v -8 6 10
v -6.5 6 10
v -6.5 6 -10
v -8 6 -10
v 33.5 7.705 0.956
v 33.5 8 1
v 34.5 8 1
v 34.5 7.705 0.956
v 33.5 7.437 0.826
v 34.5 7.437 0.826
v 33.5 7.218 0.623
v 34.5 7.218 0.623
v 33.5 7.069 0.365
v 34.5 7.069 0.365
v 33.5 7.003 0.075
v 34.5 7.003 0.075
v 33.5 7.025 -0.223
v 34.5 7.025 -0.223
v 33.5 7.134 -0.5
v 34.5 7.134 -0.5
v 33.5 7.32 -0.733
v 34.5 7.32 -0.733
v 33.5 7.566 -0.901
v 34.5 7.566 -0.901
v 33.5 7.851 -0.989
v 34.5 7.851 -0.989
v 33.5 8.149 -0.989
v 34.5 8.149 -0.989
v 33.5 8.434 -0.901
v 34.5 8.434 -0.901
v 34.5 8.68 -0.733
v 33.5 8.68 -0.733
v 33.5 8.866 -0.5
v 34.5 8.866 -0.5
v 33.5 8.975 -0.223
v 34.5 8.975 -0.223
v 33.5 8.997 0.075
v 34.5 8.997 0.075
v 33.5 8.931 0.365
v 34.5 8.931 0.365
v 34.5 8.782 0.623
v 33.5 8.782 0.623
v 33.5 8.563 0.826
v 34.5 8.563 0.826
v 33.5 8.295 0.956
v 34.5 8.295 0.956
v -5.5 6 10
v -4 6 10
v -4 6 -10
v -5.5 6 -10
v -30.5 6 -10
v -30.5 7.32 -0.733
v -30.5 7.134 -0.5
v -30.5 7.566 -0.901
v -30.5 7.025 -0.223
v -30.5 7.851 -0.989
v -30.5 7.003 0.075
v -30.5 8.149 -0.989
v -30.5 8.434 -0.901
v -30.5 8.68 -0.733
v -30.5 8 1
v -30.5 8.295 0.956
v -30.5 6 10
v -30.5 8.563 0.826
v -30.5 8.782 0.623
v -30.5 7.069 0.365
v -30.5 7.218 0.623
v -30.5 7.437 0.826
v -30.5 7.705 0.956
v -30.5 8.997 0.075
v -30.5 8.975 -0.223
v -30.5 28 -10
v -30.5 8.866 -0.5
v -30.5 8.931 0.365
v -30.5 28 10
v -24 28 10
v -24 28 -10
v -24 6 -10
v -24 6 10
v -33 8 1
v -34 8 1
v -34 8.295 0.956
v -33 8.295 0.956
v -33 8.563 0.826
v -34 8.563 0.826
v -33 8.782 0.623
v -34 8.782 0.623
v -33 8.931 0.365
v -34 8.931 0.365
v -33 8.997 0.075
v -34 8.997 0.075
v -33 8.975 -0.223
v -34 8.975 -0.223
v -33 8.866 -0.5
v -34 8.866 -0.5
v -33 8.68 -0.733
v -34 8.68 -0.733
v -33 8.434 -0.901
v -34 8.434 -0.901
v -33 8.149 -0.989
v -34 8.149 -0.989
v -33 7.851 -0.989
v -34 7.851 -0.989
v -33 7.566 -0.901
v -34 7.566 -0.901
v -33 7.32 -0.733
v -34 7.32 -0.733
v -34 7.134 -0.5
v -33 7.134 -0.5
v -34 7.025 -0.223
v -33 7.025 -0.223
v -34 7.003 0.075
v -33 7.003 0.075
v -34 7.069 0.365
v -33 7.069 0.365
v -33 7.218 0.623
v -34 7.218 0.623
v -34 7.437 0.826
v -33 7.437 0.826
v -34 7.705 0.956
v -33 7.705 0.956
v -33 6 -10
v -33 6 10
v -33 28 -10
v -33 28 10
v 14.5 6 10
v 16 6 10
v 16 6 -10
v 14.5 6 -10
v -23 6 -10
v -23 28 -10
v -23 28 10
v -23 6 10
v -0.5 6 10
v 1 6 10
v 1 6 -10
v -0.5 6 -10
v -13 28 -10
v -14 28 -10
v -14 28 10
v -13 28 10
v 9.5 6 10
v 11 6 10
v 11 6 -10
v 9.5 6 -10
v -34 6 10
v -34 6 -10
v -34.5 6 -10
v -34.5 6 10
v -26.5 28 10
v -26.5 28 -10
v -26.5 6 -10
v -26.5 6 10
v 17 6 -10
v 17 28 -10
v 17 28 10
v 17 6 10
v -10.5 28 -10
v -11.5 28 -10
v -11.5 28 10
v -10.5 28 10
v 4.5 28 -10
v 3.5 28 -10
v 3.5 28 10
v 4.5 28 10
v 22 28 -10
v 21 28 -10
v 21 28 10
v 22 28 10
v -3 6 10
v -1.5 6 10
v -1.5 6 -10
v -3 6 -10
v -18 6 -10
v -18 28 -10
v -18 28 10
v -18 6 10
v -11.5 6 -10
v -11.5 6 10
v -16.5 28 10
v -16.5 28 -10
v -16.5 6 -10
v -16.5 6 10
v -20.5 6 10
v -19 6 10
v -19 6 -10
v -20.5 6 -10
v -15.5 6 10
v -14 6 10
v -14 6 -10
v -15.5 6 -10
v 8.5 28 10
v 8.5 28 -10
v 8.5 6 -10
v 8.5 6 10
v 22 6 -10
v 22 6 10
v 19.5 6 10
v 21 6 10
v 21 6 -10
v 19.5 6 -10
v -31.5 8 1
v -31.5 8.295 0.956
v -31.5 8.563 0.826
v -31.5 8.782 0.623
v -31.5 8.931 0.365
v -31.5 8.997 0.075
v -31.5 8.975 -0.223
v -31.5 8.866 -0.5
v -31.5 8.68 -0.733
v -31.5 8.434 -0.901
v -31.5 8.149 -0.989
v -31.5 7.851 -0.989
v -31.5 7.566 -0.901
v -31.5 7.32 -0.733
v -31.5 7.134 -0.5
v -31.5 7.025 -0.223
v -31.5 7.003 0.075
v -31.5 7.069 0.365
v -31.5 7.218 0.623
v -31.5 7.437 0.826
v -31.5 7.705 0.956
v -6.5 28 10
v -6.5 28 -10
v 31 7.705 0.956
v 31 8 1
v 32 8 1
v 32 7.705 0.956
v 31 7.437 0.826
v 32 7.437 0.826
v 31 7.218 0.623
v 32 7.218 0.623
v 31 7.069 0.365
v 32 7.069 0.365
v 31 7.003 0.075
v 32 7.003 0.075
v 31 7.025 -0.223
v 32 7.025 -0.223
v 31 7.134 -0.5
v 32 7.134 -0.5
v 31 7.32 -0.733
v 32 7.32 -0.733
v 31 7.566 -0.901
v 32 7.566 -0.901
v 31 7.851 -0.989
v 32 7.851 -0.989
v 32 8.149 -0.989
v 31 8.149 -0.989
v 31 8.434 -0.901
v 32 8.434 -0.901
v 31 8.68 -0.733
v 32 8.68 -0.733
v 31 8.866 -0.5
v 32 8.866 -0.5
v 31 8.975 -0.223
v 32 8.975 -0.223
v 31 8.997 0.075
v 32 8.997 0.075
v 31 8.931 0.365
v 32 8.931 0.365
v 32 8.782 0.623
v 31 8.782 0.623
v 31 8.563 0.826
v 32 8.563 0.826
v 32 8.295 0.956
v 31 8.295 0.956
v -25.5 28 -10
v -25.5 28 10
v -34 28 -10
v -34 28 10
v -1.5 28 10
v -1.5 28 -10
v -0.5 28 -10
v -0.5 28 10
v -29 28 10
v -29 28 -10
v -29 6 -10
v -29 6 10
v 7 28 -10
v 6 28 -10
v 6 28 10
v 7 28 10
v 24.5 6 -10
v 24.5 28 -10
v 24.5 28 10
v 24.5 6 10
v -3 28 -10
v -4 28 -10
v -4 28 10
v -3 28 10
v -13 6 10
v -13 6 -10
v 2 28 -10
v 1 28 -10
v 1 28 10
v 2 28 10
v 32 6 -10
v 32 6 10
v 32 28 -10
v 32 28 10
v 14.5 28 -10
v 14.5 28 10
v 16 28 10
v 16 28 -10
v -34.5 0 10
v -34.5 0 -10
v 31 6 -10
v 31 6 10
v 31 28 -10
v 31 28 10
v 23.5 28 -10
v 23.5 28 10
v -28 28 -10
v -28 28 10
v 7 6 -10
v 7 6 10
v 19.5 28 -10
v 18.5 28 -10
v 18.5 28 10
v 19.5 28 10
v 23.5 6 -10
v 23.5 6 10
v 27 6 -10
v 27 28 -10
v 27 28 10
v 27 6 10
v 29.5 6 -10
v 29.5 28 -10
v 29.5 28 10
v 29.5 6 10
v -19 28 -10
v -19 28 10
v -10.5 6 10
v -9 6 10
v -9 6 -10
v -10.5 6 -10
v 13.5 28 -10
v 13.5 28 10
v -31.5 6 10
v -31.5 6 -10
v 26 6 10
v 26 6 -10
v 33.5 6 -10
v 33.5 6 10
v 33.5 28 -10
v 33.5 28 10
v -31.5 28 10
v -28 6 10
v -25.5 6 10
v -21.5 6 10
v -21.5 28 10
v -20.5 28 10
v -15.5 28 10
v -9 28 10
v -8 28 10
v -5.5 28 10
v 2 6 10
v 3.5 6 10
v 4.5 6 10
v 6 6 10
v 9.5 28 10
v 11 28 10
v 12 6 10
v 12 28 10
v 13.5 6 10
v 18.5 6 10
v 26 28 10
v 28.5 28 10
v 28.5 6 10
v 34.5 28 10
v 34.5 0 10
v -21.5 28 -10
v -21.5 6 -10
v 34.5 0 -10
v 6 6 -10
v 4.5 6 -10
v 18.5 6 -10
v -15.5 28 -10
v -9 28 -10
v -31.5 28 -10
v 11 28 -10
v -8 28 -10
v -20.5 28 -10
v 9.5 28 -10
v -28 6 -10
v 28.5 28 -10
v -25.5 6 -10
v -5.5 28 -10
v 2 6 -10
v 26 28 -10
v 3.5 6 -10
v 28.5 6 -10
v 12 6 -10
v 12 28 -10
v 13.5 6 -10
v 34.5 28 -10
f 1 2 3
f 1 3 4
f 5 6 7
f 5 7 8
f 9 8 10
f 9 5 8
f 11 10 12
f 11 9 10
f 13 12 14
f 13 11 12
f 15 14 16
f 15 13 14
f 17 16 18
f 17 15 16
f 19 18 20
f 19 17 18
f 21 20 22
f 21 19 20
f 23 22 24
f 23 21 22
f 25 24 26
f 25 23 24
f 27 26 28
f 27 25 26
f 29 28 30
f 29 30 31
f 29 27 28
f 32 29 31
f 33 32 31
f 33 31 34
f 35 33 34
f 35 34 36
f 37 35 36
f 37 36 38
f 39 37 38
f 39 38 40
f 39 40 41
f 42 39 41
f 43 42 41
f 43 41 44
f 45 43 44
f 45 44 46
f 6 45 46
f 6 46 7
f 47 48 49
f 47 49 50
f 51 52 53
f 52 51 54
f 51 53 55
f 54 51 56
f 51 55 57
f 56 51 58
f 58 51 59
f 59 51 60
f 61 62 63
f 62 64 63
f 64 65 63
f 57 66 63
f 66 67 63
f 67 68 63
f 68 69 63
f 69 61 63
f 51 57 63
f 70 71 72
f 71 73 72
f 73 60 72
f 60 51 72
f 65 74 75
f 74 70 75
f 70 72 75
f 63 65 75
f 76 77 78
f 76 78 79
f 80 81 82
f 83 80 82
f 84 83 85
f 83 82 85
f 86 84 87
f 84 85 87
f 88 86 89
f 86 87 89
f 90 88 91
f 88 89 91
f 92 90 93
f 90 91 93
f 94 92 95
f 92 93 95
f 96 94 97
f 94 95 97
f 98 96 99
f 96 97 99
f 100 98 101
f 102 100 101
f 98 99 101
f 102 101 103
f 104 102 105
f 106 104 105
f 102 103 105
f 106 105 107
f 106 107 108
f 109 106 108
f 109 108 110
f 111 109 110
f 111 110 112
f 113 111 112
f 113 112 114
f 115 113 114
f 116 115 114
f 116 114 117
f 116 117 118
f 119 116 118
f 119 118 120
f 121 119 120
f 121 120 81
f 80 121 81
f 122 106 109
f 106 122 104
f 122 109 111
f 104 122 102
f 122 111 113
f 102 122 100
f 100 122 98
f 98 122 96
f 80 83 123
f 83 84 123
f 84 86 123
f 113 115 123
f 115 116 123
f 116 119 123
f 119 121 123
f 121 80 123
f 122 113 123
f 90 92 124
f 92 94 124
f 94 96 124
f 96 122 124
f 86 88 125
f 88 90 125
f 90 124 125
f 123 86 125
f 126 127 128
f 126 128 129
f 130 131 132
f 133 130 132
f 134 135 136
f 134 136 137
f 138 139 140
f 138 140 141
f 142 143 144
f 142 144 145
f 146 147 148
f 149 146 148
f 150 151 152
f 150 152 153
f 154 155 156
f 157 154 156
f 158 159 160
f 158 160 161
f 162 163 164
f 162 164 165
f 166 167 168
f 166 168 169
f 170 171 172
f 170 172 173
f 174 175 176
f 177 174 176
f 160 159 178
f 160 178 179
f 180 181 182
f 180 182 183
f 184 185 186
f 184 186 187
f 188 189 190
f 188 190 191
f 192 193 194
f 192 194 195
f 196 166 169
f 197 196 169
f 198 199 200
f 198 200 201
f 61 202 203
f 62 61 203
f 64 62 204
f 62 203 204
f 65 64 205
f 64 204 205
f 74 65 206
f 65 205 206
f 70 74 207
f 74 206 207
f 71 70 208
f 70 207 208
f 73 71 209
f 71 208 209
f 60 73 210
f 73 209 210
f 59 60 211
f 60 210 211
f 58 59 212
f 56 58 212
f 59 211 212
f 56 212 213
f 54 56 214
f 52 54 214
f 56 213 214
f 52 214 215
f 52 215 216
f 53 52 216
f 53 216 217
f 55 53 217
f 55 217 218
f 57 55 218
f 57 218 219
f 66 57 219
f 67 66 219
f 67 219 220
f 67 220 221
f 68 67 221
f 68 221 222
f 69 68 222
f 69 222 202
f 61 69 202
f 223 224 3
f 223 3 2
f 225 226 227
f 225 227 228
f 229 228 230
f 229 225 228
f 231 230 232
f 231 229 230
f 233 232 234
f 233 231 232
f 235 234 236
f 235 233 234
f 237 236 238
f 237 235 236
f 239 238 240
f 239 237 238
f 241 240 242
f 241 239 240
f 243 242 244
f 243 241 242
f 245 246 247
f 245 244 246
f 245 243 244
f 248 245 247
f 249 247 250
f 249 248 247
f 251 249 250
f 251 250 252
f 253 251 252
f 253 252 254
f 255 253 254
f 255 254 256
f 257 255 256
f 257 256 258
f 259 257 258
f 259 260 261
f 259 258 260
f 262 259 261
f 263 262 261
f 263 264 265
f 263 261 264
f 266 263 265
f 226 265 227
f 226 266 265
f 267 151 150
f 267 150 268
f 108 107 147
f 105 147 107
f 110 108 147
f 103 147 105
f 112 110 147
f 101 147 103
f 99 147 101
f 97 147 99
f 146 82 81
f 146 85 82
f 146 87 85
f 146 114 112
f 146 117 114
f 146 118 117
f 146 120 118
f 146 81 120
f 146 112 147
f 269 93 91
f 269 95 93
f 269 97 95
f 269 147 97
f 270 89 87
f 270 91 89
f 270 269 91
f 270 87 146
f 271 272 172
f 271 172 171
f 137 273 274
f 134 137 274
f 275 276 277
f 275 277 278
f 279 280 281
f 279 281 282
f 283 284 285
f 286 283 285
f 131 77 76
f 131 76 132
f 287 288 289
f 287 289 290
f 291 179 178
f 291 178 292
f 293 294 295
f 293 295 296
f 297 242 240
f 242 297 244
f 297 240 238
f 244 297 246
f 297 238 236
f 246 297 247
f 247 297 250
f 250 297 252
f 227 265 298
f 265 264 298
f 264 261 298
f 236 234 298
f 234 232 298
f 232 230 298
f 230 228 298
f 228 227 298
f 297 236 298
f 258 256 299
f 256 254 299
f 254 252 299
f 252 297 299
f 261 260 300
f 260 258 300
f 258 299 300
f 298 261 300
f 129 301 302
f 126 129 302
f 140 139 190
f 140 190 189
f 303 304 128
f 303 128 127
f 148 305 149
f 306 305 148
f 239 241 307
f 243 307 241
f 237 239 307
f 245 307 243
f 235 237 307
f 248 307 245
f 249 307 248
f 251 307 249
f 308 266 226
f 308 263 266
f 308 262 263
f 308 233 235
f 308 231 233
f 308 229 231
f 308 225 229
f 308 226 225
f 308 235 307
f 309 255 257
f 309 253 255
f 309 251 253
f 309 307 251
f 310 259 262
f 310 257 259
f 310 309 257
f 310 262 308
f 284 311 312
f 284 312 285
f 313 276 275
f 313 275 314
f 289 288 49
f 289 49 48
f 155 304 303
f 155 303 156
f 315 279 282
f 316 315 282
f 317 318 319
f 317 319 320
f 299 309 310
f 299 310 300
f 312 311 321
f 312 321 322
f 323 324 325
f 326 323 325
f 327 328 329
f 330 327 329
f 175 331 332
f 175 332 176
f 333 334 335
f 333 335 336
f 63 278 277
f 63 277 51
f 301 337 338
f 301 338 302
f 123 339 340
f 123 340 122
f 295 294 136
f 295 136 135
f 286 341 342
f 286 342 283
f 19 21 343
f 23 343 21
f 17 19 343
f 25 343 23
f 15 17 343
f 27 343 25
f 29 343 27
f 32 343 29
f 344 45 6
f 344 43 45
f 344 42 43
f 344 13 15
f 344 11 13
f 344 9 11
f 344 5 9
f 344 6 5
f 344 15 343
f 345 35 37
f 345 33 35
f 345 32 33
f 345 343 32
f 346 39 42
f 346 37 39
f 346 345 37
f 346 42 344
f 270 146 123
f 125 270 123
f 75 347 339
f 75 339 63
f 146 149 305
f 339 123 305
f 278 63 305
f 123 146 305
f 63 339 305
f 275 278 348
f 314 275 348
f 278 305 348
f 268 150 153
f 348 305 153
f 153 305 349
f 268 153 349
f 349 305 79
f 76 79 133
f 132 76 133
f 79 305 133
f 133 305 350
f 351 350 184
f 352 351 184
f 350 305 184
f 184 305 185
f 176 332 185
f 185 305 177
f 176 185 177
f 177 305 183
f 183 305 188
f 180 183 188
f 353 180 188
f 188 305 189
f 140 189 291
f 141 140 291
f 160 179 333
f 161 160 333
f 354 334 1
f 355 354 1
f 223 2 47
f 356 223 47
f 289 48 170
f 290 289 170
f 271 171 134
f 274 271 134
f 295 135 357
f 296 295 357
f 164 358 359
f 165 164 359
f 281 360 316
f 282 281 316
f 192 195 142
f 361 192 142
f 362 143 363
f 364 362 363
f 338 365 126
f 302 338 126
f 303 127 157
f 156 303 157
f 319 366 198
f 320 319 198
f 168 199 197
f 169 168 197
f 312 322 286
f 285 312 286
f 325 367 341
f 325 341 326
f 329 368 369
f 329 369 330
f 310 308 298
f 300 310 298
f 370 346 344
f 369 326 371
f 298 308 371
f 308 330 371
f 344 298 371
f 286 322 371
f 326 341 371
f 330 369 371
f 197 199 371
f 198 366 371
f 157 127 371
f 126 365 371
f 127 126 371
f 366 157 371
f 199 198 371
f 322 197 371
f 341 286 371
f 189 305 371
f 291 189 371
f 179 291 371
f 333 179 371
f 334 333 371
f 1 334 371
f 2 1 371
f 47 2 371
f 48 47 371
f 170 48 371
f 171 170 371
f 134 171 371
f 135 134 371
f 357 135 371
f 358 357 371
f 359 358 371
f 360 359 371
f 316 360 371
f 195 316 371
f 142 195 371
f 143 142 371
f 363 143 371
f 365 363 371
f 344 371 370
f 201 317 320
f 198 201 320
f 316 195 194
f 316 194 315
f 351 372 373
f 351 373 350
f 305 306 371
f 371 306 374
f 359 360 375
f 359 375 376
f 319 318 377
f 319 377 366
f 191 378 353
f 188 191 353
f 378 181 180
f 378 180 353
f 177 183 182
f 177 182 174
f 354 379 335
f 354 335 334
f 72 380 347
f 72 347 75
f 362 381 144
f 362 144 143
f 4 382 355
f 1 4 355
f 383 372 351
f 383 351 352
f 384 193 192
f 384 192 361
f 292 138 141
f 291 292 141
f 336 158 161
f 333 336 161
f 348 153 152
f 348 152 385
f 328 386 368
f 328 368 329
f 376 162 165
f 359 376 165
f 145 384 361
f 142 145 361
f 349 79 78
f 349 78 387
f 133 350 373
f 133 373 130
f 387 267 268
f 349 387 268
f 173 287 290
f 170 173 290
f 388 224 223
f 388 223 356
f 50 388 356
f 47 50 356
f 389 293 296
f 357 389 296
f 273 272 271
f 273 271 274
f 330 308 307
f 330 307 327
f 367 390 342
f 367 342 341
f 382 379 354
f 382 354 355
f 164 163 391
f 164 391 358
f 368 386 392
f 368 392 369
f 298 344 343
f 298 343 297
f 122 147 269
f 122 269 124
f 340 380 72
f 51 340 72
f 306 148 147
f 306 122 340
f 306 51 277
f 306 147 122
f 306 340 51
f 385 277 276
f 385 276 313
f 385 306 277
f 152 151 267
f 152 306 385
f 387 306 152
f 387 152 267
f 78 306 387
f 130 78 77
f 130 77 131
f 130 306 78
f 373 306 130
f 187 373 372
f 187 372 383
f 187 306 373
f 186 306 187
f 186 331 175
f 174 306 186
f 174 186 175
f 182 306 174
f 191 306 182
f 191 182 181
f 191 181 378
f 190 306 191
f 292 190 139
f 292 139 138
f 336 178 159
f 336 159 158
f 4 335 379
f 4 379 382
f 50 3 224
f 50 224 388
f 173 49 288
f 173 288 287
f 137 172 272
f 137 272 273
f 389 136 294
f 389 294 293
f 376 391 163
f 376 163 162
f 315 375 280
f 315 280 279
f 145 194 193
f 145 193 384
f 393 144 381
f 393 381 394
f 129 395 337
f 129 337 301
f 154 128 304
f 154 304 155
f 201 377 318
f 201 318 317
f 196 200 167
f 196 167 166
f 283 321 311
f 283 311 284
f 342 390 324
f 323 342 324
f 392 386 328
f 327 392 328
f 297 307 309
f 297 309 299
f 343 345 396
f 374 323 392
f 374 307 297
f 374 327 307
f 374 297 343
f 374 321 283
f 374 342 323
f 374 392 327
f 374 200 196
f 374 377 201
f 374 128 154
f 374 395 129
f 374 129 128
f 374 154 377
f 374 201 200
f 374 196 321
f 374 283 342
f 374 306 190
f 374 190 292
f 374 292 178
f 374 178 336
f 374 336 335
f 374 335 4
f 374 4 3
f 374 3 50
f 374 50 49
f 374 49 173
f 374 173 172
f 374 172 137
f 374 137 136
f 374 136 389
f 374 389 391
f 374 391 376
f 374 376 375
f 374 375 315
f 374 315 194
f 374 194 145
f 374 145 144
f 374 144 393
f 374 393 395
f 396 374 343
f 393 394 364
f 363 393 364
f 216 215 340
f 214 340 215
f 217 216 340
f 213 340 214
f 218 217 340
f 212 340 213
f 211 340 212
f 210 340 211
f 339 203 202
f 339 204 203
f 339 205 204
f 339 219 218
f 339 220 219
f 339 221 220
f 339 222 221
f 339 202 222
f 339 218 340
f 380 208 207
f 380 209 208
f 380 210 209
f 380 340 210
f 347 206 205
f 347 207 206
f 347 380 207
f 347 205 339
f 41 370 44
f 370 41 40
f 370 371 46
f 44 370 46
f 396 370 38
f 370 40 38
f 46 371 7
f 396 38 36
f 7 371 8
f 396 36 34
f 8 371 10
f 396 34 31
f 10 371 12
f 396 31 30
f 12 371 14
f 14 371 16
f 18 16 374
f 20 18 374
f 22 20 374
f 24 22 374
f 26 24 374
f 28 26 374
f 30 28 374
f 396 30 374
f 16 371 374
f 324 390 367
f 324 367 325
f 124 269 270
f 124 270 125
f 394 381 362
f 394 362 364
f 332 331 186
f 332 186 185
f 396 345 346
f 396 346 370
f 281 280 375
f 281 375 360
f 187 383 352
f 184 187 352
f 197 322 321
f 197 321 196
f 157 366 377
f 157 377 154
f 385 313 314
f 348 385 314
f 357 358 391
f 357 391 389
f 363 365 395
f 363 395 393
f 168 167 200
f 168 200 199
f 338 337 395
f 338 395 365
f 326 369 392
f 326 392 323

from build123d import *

# Parameters (mm, degrees)
SKETCH_1_W          = 69
SKETCH_1_H          = 20
EXTRUDE_1_DEPTH     = 28
SKETCH_2_W          = 1.5
SKETCH_2_H          = 20
CUT_EXTRUDE_1_DEPTH = 22
SKETCH_3_R          = 1
CUT_EXTRUDE_2_DEPTH = 5
CUT_EXTRUDE_START   = -5
SKETCH_4_R          = 1
CUT_EXTRUDE_3_DEPTH = 5


with BuildPart() as part:
    # 草图1 → 拉伸1 (new body)
    with BuildSketch(Plane(origin=(0, 0, 0), x_dir=(1, 0, 0), z_dir=(0, 1, 0))):
        Rectangle(SKETCH_1_W, SKETCH_1_H)
    extrude(amount=EXTRUDE_1_DEPTH)

    # 草图2 → 切除-拉伸1 (cut)
    with BuildSketch(Plane(origin=(0, 28, 0), x_dir=(-1, 0, 0), z_dir=(0, 1, 0))):
        with Locations((-0.25, 0)):
            Rectangle(SKETCH_2_W, SKETCH_2_H)
        with Locations((2.25, 0)):
            Rectangle(SKETCH_2_W, SKETCH_2_H)
        with Locations((4.75, 0)):
            Rectangle(SKETCH_2_W, SKETCH_2_H)
        with Locations((7.25, 0)):
            Rectangle(SKETCH_2_W, SKETCH_2_H)
        with Locations((9.75, 0)):
            Rectangle(SKETCH_2_W, SKETCH_2_H)
        with Locations((12.25, 0)):
            Rectangle(SKETCH_2_W, SKETCH_2_H)
        with Locations((14.75, 0)):
            Rectangle(SKETCH_2_W, SKETCH_2_H)
        with Locations((17.25, 0)):
            Rectangle(SKETCH_2_W, SKETCH_2_H)
        with Locations((19.75, 0)):
            Rectangle(SKETCH_2_W, SKETCH_2_H)
        with Locations((22.25, 0)):
            Rectangle(SKETCH_2_W, SKETCH_2_H)
        with Locations((24.75, 0)):
            Rectangle(SKETCH_2_W, SKETCH_2_H)
        with Locations((27.25, 0)):
            Rectangle(SKETCH_2_W, SKETCH_2_H)
        with Locations((29.75, 0)):
            Rectangle(SKETCH_2_W, SKETCH_2_H)
        with Locations((32.25, 0)):
            Rectangle(SKETCH_2_W, SKETCH_2_H)
        with Locations((34.75, 0)):
            Rectangle(SKETCH_2_W, SKETCH_2_H)
        with Locations((-2.75, 0)):
            Rectangle(SKETCH_2_W, SKETCH_2_H)
        with Locations((-5.25, 0)):
            Rectangle(SKETCH_2_W, SKETCH_2_H)
        with Locations((-7.75, 0)):
            Rectangle(SKETCH_2_W, SKETCH_2_H)
        with Locations((-10.25, 0)):
            Rectangle(SKETCH_2_W, SKETCH_2_H)
        with Locations((-12.75, 0)):
            Rectangle(SKETCH_2_W, SKETCH_2_H)
        with Locations((-15.25, 0)):
            Rectangle(SKETCH_2_W, SKETCH_2_H)
        with Locations((-17.75, 0)):
            Rectangle(SKETCH_2_W, SKETCH_2_H)
        with Locations((-20.25, 0)):
            Rectangle(SKETCH_2_W, SKETCH_2_H)
        with Locations((-22.75, 0)):
            Rectangle(SKETCH_2_W, SKETCH_2_H)
        with Locations((-25.25, 0)):
            Rectangle(SKETCH_2_W, SKETCH_2_H)
        with Locations((-27.75, 0)):
            Rectangle(SKETCH_2_W, SKETCH_2_H)
        with Locations((-30.25, 0)):
            Rectangle(SKETCH_2_W, SKETCH_2_H)
        with Locations((-32.75, 0)):
            Rectangle(SKETCH_2_W, SKETCH_2_H)
    extrude(amount=-CUT_EXTRUDE_1_DEPTH, mode=Mode.SUBTRACT)

    # 草图3 → 切除-拉伸2 (cut)
    with BuildSketch(Plane.ZY.offset(34)):
        with Locations((0, 8)):
            Circle(SKETCH_3_R)
    extrude(amount=-CUT_EXTRUDE_2_DEPTH, mode=Mode.SUBTRACT)

    # 草图4 → 切除-拉伸3 (cut)
    with BuildSketch(Plane(origin=(34.5, 0, 0), x_dir=(0, 0, -1), z_dir=(1, 0, 0)).offset(CUT_EXTRUDE_START)):
        with Locations(Location((0, 8, 0), (0, 0, 180))):
            Circle(SKETCH_4_R)
    extrude(amount=CUT_EXTRUDE_3_DEPTH, mode=Mode.SUBTRACT)


solid = part.part
